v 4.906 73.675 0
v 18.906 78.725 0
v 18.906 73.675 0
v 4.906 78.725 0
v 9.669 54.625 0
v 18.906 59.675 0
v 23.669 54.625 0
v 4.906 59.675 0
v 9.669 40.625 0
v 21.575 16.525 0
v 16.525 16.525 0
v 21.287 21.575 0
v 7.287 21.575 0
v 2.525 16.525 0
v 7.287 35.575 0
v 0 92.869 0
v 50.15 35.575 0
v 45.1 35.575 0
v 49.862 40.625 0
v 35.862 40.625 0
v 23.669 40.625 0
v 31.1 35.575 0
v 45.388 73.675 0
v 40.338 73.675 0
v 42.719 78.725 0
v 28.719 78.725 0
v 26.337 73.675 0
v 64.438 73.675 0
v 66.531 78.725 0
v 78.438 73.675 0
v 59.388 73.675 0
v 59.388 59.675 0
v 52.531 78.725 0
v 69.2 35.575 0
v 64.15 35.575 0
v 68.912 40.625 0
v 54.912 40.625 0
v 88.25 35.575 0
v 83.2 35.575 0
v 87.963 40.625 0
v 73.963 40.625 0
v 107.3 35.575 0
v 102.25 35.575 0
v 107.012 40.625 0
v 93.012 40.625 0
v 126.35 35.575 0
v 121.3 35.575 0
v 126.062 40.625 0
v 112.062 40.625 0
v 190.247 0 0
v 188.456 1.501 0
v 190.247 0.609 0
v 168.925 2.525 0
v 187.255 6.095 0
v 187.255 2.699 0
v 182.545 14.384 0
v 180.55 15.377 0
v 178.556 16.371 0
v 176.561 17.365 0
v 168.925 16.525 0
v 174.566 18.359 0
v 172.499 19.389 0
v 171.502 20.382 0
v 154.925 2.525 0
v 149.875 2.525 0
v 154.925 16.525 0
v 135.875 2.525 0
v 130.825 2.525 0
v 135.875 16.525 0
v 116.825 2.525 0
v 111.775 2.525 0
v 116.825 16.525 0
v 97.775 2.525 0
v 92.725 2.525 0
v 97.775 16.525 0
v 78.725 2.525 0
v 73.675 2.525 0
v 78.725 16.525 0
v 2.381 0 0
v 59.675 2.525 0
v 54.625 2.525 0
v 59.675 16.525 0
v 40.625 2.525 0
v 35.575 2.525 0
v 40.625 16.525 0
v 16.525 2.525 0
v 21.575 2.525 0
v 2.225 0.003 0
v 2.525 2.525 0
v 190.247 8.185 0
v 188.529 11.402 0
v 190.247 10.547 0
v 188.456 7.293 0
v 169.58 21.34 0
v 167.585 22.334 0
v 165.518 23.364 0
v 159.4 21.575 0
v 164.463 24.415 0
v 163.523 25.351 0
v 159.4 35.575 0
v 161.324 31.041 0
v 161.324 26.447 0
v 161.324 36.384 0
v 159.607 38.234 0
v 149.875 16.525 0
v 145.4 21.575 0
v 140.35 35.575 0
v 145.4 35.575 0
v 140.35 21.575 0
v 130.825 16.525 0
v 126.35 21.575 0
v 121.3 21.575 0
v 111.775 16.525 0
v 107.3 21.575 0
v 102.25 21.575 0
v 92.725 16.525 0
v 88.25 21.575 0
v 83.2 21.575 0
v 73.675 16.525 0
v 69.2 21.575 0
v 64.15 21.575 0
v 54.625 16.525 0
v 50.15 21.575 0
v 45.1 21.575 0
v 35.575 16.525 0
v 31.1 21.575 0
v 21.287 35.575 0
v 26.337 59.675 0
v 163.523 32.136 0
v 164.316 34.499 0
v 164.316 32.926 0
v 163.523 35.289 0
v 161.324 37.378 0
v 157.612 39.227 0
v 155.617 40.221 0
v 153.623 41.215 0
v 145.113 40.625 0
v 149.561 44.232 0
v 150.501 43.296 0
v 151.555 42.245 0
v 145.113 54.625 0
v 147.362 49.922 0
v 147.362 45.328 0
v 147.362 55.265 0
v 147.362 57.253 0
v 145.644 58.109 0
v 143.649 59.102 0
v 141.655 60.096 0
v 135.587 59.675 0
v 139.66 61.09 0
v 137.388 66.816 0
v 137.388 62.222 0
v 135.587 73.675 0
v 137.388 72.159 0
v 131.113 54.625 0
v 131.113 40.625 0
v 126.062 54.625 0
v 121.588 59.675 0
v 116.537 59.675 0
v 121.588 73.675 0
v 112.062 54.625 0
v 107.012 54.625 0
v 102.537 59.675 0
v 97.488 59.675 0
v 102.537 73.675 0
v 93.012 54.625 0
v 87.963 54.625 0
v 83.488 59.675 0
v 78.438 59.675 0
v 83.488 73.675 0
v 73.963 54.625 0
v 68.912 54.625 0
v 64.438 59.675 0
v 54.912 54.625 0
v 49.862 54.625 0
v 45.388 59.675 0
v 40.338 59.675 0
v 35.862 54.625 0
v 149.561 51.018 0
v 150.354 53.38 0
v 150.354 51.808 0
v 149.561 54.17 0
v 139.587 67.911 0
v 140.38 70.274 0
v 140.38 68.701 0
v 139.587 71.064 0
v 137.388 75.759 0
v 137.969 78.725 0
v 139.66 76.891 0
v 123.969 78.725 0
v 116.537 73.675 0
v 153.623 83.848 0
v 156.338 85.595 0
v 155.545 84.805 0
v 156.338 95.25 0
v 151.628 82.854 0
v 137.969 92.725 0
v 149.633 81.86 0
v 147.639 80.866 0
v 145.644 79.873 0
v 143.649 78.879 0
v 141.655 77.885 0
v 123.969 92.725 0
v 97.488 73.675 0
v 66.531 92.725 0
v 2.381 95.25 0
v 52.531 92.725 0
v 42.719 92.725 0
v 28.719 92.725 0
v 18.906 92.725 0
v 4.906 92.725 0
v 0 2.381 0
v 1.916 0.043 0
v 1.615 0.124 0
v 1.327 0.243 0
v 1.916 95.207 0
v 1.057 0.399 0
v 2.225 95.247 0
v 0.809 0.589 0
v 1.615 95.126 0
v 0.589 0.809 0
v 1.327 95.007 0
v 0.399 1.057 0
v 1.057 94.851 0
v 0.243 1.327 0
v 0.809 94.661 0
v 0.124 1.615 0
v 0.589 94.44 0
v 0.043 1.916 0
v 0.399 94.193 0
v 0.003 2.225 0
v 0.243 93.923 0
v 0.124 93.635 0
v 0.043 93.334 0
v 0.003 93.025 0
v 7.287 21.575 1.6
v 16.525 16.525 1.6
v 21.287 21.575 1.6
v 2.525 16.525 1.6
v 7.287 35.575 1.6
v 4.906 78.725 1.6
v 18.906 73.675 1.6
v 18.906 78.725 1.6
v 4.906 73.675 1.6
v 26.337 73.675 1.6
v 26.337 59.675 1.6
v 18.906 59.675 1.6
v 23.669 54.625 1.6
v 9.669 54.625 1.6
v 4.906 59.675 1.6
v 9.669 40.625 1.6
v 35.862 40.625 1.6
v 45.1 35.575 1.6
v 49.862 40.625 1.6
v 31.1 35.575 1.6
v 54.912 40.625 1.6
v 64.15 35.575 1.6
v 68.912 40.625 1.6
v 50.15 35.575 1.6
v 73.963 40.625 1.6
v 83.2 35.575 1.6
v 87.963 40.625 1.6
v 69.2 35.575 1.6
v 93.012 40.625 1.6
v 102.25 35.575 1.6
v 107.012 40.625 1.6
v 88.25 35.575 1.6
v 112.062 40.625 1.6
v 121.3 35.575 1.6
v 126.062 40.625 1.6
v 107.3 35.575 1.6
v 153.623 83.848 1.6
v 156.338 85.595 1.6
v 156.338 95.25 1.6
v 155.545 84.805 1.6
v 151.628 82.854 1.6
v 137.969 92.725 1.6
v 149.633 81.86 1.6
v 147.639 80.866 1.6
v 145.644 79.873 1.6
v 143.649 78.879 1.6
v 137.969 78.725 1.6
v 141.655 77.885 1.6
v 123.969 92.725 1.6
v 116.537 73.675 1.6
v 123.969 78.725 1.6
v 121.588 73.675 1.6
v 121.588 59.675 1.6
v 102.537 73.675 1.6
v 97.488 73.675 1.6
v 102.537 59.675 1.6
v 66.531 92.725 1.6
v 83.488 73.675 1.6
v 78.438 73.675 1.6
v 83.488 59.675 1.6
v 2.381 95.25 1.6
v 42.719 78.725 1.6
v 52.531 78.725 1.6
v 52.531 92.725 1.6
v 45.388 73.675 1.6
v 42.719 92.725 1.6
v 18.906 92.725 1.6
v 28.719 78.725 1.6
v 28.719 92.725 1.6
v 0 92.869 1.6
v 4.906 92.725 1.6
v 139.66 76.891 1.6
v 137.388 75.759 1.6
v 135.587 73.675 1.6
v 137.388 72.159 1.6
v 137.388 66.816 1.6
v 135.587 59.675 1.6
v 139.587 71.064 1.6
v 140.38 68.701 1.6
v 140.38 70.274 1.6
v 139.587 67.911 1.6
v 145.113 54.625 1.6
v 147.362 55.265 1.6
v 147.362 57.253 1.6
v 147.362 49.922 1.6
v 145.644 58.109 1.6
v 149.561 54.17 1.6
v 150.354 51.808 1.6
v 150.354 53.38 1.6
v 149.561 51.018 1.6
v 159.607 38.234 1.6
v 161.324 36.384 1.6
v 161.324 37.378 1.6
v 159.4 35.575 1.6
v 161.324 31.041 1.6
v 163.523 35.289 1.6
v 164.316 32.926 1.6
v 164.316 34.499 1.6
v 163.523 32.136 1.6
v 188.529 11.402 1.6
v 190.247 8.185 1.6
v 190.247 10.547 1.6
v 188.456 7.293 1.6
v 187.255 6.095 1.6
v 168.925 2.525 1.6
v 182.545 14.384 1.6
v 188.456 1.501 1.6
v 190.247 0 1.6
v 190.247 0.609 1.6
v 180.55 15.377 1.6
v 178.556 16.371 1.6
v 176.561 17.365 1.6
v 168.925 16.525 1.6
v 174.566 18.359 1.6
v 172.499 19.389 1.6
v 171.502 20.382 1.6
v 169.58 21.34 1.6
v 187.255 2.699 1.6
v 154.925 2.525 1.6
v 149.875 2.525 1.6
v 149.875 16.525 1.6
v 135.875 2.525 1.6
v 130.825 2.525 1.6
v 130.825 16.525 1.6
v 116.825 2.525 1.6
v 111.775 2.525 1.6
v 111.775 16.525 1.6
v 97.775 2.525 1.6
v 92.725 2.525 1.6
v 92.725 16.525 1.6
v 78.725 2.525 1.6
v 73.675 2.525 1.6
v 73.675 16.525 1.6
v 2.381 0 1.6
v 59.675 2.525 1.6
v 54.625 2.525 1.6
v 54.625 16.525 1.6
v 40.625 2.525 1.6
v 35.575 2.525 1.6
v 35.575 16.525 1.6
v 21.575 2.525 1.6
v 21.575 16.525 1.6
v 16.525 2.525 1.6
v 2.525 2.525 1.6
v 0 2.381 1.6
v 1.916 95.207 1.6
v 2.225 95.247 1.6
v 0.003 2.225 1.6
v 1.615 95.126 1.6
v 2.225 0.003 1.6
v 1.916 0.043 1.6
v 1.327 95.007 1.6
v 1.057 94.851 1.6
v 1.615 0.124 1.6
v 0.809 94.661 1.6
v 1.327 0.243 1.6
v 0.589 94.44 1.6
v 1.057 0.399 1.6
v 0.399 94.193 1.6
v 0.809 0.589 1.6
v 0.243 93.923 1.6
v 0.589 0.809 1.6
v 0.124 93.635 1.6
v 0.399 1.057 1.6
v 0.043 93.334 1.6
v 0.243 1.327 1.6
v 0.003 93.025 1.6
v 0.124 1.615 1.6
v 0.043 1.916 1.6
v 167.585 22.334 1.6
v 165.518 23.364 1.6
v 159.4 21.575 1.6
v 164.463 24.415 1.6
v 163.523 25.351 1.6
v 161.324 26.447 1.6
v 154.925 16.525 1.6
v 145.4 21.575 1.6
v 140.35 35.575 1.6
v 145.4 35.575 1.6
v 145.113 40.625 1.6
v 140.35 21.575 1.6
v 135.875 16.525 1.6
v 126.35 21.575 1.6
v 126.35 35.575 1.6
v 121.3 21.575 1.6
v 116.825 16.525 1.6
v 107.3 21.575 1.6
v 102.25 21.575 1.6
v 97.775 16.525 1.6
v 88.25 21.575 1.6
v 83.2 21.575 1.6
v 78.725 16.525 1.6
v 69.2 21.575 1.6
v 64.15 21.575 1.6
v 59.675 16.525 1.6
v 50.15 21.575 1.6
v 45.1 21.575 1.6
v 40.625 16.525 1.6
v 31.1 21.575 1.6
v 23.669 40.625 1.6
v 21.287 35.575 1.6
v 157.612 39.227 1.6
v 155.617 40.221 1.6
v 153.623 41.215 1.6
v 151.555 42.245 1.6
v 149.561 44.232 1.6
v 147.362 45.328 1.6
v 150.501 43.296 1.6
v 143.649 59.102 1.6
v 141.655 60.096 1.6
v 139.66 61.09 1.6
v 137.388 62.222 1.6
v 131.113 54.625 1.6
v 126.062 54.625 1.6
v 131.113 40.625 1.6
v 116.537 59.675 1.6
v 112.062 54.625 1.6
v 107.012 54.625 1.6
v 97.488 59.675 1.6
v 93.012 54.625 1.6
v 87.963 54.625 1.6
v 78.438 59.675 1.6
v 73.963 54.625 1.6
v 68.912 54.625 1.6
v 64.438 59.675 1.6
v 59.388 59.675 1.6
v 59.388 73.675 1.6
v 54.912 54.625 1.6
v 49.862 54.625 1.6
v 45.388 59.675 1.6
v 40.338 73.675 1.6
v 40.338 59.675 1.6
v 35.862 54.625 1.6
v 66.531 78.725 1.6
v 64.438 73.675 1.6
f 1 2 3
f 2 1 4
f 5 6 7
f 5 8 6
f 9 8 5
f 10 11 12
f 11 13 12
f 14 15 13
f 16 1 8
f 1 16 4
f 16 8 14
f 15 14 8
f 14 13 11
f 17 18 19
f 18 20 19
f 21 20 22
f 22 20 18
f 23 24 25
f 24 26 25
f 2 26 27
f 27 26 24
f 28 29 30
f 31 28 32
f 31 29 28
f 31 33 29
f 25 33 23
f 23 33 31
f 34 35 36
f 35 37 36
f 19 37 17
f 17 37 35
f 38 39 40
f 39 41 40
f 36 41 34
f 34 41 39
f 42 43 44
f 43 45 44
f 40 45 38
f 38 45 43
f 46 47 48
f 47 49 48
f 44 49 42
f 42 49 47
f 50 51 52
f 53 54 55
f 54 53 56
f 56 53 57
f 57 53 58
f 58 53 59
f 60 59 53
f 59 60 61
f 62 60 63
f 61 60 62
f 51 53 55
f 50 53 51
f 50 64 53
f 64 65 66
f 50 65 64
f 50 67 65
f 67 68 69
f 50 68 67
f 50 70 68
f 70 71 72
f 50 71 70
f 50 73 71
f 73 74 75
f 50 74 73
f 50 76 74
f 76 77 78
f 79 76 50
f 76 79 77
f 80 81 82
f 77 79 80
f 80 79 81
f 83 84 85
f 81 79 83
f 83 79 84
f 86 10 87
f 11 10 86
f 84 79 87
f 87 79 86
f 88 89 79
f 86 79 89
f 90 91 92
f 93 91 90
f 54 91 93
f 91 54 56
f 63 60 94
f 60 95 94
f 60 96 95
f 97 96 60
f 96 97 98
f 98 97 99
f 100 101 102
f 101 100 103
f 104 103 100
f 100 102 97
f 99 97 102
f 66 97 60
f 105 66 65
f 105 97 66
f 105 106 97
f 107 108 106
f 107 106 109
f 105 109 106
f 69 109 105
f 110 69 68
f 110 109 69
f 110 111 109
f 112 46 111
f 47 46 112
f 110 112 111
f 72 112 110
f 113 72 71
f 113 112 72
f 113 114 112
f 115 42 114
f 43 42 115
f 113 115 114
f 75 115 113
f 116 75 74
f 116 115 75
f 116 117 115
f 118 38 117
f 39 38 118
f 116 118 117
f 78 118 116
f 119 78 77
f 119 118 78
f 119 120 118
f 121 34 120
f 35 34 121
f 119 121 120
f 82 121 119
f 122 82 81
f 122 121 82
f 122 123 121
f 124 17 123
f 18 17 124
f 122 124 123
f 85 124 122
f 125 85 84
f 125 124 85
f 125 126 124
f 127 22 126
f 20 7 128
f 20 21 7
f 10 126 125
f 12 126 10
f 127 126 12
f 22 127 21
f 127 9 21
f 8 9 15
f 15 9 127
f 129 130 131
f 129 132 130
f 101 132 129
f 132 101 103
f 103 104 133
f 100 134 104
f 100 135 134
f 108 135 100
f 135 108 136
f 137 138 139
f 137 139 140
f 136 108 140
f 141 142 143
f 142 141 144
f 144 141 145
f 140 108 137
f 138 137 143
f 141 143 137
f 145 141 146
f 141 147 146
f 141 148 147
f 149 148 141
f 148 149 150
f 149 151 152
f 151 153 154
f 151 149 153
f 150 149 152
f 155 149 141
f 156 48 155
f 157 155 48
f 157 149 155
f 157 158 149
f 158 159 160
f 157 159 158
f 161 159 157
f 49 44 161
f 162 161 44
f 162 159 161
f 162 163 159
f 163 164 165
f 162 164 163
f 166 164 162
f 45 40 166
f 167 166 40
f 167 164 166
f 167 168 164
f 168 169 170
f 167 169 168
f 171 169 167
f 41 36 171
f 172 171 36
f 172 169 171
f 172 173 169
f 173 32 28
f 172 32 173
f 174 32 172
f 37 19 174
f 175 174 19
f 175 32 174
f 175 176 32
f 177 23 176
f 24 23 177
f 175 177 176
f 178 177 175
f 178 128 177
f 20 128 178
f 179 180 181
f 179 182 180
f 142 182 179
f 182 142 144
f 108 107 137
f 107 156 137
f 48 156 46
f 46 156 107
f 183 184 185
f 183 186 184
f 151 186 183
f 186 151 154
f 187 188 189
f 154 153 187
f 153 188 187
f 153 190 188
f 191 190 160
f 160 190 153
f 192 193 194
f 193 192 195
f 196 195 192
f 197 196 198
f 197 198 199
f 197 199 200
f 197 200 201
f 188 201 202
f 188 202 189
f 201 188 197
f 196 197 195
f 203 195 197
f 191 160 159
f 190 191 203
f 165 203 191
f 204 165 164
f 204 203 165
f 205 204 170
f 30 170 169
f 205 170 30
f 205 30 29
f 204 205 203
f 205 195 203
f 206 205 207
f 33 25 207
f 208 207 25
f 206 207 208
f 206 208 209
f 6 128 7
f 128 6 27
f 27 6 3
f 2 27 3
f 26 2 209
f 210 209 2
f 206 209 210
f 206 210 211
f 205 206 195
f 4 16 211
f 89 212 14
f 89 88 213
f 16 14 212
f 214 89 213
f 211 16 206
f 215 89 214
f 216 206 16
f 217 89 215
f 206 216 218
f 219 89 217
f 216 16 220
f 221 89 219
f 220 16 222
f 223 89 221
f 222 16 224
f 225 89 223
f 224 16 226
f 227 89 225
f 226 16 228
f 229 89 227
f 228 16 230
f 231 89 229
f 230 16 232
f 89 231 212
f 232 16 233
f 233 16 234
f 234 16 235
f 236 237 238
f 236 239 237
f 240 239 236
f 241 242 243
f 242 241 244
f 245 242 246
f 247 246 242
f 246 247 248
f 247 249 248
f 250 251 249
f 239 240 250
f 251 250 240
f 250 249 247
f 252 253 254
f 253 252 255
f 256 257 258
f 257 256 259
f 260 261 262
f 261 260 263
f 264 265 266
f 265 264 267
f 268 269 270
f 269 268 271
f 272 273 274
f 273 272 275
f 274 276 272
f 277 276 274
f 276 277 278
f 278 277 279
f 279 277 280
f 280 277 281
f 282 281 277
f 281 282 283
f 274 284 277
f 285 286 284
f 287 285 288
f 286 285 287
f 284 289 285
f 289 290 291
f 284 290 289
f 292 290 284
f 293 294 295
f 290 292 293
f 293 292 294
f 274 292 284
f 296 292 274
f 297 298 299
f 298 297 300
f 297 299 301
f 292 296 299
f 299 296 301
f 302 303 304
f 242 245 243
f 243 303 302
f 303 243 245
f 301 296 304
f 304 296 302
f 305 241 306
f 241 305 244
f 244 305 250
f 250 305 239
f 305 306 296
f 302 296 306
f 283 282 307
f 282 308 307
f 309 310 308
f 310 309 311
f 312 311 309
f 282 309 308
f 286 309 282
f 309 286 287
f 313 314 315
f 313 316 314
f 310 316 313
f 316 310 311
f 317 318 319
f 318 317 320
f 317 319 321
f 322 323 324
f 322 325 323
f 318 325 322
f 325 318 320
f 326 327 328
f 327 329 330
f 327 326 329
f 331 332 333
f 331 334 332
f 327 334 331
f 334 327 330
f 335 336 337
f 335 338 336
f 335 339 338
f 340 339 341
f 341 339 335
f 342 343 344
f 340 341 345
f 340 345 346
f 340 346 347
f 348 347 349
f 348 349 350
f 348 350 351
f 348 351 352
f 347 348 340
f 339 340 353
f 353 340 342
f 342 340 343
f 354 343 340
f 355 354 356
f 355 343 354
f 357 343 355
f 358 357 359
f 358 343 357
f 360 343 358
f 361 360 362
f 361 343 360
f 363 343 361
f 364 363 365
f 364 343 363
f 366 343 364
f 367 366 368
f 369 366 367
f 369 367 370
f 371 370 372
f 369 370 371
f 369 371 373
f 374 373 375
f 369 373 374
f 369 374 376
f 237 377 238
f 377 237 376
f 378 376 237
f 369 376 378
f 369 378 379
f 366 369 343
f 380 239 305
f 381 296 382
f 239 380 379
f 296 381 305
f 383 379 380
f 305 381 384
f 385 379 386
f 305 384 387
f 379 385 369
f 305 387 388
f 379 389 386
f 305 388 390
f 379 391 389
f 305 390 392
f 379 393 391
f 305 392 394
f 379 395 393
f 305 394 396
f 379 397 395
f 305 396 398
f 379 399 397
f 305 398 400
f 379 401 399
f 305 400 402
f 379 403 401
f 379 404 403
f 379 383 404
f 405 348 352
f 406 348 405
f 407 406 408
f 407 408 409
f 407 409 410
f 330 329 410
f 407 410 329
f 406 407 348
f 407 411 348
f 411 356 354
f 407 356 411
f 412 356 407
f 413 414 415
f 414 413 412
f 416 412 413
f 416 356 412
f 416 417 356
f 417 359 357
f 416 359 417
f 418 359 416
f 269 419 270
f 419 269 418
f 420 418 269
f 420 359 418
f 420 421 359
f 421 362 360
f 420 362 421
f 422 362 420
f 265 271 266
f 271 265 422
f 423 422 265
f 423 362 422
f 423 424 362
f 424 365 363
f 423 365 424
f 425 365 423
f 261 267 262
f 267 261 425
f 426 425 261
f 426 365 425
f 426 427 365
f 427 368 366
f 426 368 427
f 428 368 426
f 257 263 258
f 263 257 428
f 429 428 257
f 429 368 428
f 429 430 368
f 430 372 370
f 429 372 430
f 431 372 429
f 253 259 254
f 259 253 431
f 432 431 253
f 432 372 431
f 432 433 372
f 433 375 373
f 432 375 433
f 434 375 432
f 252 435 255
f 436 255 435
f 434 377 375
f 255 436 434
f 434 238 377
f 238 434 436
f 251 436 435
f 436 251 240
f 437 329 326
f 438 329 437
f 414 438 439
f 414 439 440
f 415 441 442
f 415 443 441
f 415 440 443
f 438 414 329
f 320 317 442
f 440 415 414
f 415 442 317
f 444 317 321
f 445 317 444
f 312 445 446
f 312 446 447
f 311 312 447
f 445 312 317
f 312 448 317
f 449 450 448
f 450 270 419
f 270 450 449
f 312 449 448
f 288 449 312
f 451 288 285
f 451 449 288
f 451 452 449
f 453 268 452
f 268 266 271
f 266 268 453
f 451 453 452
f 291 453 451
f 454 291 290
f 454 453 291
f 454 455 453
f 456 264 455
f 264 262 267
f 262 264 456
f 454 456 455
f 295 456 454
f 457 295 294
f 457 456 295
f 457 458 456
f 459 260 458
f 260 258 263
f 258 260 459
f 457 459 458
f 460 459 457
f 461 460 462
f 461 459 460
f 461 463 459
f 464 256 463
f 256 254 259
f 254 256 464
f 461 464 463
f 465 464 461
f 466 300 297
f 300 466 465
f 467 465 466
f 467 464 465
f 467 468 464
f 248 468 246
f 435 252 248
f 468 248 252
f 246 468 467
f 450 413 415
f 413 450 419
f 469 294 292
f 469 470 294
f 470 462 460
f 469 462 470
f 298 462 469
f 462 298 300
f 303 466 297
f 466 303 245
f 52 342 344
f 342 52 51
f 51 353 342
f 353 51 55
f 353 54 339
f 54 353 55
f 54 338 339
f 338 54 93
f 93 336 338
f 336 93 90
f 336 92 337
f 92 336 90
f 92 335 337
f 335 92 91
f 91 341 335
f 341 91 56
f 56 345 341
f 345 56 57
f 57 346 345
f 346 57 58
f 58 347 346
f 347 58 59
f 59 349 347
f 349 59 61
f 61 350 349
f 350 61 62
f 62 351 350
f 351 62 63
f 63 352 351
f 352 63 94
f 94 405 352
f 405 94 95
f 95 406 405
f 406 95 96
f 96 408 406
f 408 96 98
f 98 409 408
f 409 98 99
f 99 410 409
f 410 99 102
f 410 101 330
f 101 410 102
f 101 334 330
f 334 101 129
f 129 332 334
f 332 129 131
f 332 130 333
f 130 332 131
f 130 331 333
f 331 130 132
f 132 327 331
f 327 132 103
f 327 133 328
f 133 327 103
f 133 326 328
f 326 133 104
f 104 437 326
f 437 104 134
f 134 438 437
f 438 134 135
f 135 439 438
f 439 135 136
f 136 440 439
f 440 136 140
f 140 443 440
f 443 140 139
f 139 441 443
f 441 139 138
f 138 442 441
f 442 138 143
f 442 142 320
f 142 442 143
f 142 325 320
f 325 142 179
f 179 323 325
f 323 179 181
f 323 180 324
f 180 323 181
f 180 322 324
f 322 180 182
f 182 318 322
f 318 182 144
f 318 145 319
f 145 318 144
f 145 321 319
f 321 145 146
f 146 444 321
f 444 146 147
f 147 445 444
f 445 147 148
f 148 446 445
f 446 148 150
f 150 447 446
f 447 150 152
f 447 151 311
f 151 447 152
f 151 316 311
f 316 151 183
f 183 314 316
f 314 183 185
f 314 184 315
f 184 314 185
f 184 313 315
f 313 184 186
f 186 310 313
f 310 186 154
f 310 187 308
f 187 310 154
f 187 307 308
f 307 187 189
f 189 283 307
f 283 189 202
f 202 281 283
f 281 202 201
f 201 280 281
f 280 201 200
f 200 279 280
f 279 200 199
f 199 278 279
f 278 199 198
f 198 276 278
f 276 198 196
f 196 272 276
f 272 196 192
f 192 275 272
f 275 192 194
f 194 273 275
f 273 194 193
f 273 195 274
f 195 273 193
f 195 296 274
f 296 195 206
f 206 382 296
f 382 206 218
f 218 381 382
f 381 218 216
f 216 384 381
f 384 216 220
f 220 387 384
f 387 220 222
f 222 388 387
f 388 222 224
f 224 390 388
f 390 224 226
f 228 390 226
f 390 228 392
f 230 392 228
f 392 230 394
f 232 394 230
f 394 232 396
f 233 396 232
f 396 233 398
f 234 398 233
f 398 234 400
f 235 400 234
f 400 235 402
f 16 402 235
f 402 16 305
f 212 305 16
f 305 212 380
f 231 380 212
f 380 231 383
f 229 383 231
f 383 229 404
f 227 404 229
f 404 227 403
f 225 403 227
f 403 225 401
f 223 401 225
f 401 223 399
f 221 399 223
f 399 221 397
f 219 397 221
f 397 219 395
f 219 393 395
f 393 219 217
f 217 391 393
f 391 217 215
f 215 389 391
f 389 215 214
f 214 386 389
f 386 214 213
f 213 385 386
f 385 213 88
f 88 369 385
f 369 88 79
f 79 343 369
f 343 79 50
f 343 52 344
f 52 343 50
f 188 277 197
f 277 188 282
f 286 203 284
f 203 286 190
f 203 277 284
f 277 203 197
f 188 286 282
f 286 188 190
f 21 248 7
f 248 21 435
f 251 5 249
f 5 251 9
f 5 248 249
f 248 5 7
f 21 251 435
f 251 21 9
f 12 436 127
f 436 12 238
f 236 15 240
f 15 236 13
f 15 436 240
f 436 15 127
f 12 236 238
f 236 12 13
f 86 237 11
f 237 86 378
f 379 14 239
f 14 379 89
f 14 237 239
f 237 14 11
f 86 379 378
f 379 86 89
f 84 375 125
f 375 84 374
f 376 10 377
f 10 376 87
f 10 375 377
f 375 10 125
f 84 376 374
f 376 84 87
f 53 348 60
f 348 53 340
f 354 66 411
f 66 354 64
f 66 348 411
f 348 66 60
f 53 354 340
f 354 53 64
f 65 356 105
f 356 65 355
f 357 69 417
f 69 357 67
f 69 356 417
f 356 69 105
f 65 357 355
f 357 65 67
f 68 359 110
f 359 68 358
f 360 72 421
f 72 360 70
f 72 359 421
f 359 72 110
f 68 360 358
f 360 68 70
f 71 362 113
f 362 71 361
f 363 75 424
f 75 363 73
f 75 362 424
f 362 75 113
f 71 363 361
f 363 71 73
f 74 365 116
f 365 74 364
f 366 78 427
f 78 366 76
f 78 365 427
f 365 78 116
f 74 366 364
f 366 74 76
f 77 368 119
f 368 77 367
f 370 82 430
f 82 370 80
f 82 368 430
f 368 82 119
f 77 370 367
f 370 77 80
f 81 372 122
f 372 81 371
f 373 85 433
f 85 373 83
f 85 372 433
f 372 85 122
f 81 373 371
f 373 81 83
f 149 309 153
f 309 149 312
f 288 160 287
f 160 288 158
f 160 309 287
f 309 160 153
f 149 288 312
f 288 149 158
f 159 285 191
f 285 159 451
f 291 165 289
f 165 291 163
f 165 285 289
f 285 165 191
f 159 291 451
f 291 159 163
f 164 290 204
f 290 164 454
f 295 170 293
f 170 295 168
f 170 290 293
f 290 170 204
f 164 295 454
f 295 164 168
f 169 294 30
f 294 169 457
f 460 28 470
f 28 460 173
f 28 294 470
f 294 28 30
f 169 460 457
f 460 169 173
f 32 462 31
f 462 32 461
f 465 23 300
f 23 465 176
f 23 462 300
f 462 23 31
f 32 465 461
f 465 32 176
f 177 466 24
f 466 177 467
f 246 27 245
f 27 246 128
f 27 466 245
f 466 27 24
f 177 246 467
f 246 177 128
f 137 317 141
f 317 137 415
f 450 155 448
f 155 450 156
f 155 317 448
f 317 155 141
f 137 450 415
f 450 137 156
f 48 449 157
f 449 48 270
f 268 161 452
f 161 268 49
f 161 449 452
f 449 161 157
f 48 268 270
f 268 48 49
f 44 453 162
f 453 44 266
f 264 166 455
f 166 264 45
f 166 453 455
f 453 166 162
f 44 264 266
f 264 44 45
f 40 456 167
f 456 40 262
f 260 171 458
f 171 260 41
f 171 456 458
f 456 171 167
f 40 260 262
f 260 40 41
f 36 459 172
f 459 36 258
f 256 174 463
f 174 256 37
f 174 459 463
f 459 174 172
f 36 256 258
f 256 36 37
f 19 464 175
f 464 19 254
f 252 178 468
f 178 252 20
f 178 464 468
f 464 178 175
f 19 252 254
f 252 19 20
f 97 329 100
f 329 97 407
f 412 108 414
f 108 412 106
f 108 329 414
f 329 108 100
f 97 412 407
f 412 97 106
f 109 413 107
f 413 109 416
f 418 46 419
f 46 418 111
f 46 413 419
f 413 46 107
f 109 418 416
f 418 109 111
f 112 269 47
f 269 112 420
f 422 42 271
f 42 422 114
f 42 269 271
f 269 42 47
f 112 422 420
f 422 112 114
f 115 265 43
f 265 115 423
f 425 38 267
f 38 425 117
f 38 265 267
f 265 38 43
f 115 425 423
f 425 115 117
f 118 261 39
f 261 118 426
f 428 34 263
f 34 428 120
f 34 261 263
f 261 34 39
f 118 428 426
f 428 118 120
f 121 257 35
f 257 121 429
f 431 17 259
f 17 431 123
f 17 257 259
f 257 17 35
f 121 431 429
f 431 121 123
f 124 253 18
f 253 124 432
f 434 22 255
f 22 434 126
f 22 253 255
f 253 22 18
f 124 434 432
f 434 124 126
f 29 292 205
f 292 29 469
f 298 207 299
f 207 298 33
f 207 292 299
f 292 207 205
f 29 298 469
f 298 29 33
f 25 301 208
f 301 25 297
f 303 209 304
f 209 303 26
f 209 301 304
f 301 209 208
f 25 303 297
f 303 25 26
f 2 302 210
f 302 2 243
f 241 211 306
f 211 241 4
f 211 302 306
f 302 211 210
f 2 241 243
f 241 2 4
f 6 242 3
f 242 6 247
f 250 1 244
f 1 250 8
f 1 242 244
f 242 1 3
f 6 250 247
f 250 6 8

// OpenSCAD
// HS source-bound research preview; NOT a finished or printed keyboard plate.
// Original KiCad board edges and selected virtual cut are immutable evidence.
// Key aperture axis/orientation/stabilizers and mounting are NOT physically verified.
plate_thickness=1.6;
// 35 retained source key centers; no mounting points designed.
difference(){
  linear_extrude(height=plate_thickness) polygon(points=[[2.38125,0],[2.22534,0.00255],[1.91619,0.04325],[1.615,0.12395],[1.32692,0.24328],[1.05688,0.39919],[0.8095,0.58901],[0.58901,0.8095],[0.39919,1.05688],[0.24328,1.32692],[0.12395,1.615],[0.04325,1.91619],[0.00255,2.22534],[0,2.38125],[0,92.86875],[0.00255,93.02466],[0.04325,93.33381],[0.12395,93.635],[0.24328,93.92308],[0.39919,94.19312],[0.58901,94.4405],[0.8095,94.66099],[1.05688,94.85081],[1.32692,95.00672],[1.615,95.12605],[1.91619,95.20675],[2.22534,95.24745],[2.38125,95.25],[156.3376,95.25],[156.3376,85.59514],[155.5447,84.8051],[153.62264,83.84754],[151.62792,82.85383],[149.63334,81.86003],[147.63862,80.86633],[145.64404,79.87253],[143.64932,78.87883],[141.65474,77.88503],[139.66002,76.89133],[137.3884,75.7595],[137.3884,72.1593],[139.58748,71.06362],[140.3803,70.27358],[140.3803,68.70142],[139.58749,67.91139],[137.3884,66.81582],[137.3884,62.2218],[139.66005,61.08996],[141.65474,60.09627],[143.64935,59.10246],[145.64404,58.10877],[147.3616,57.253],[147.3616,55.26549],[149.56079,54.16981],[150.3536,53.37986],[150.3536,51.80762],[149.56079,51.01759],[147.3616,49.92202],[147.3616,45.32798],[149.56079,44.23241],[150.50069,43.29581],[151.55539,42.24491],[153.62264,41.21496],[155.61724,40.22127],[157.61194,39.22746],[159.60654,38.23377],[161.3242,37.37799],[161.3242,36.3843],[163.5233,35.28861],[164.3162,34.49865],[164.3162,32.92644],[163.52329,32.13639],[161.3242,31.0407],[161.3242,26.4468],[163.5233,25.35111],[164.46329,24.41461],[165.51798,23.36362],[167.58515,22.33366],[169.57984,21.33996],[171.5019,20.3824],[172.4993,19.3886],[174.56644,18.35877],[176.56114,17.36496],[178.55574,16.37127],[180.55044,15.37746],[182.54504,14.38377],[184.53974,13.38996],[186.53434,12.39627],[188.52903,11.40247],[190.2466,10.5467],[190.2466,8.18452],[188.45649,7.29269],[187.2547,6.09512],[187.2547,2.69868],[188.45649,1.50111],[190.2466,0.60928],[190.2466,0]]);
    translate([123.96875,78.725,-0.15]) cube([14.0,14.0,plate_thickness+0.3]);
    translate([9.66875,40.625,-0.15]) cube([14.0,14.0,plate_thickness+0.3]);
    translate([7.2875,21.575,-0.15]) cube([14.0,14.0,plate_thickness+0.3]);
    translate([2.525,2.525,-0.15]) cube([14.0,14.0,plate_thickness+0.3]);
    translate([21.575,2.525,-0.15]) cube([14.0,14.0,plate_thickness+0.3]);
    translate([154.925,2.525,-0.15]) cube([14.0,14.0,plate_thickness+0.3]);
    translate([135.875,2.525,-0.15]) cube([14.0,14.0,plate_thickness+0.3]);
    translate([116.825,2.525,-0.15]) cube([14.0,14.0,plate_thickness+0.3]);
    translate([97.775,2.525,-0.15]) cube([14.0,14.0,plate_thickness+0.3]);
    translate([78.725,2.525,-0.15]) cube([14.0,14.0,plate_thickness+0.3]);
    translate([59.675,2.525,-0.15]) cube([14.0,14.0,plate_thickness+0.3]);
    translate([40.625,2.525,-0.15]) cube([14.0,14.0,plate_thickness+0.3]);
    translate([121.5875,59.675,-0.15]) cube([14.0,14.0,plate_thickness+0.3]);
    translate([102.5375,59.675,-0.15]) cube([14.0,14.0,plate_thickness+0.3]);
    translate([83.4875,59.675,-0.15]) cube([14.0,14.0,plate_thickness+0.3]);
    translate([64.4375,59.675,-0.15]) cube([14.0,14.0,plate_thickness+0.3]);
    translate([45.3875,59.675,-0.15]) cube([14.0,14.0,plate_thickness+0.3]);
    translate([26.3375,59.675,-0.15]) cube([14.0,14.0,plate_thickness+0.3]);
    translate([131.1125,40.625,-0.15]) cube([14.0,14.0,plate_thickness+0.3]);
    translate([112.0625,40.625,-0.15]) cube([14.0,14.0,plate_thickness+0.3]);
    translate([93.0125,40.625,-0.15]) cube([14.0,14.0,plate_thickness+0.3]);
    translate([73.9625,40.625,-0.15]) cube([14.0,14.0,plate_thickness+0.3]);
    translate([54.9125,40.625,-0.15]) cube([14.0,14.0,plate_thickness+0.3]);
    translate([35.8625,40.625,-0.15]) cube([14.0,14.0,plate_thickness+0.3]);
    translate([145.4,21.575,-0.15]) cube([14.0,14.0,plate_thickness+0.3]);
    translate([126.35,21.575,-0.15]) cube([14.0,14.0,plate_thickness+0.3]);
    translate([107.3,21.575,-0.15]) cube([14.0,14.0,plate_thickness+0.3]);
    translate([88.25,21.575,-0.15]) cube([14.0,14.0,plate_thickness+0.3]);
    translate([69.2,21.575,-0.15]) cube([14.0,14.0,plate_thickness+0.3]);
    translate([50.15,21.575,-0.15]) cube([14.0,14.0,plate_thickness+0.3]);
    translate([31.1,21.575,-0.15]) cube([14.0,14.0,plate_thickness+0.3]);
    translate([52.53125,78.725,-0.15]) cube([14.0,14.0,plate_thickness+0.3]);
    translate([28.71875,78.725,-0.15]) cube([14.0,14.0,plate_thickness+0.3]);
    translate([4.90625,78.725,-0.15]) cube([14.0,14.0,plate_thickness+0.3]);
    translate([4.90625,59.675,-0.15]) cube([14.0,14.0,plate_thickness+0.3]);
}
